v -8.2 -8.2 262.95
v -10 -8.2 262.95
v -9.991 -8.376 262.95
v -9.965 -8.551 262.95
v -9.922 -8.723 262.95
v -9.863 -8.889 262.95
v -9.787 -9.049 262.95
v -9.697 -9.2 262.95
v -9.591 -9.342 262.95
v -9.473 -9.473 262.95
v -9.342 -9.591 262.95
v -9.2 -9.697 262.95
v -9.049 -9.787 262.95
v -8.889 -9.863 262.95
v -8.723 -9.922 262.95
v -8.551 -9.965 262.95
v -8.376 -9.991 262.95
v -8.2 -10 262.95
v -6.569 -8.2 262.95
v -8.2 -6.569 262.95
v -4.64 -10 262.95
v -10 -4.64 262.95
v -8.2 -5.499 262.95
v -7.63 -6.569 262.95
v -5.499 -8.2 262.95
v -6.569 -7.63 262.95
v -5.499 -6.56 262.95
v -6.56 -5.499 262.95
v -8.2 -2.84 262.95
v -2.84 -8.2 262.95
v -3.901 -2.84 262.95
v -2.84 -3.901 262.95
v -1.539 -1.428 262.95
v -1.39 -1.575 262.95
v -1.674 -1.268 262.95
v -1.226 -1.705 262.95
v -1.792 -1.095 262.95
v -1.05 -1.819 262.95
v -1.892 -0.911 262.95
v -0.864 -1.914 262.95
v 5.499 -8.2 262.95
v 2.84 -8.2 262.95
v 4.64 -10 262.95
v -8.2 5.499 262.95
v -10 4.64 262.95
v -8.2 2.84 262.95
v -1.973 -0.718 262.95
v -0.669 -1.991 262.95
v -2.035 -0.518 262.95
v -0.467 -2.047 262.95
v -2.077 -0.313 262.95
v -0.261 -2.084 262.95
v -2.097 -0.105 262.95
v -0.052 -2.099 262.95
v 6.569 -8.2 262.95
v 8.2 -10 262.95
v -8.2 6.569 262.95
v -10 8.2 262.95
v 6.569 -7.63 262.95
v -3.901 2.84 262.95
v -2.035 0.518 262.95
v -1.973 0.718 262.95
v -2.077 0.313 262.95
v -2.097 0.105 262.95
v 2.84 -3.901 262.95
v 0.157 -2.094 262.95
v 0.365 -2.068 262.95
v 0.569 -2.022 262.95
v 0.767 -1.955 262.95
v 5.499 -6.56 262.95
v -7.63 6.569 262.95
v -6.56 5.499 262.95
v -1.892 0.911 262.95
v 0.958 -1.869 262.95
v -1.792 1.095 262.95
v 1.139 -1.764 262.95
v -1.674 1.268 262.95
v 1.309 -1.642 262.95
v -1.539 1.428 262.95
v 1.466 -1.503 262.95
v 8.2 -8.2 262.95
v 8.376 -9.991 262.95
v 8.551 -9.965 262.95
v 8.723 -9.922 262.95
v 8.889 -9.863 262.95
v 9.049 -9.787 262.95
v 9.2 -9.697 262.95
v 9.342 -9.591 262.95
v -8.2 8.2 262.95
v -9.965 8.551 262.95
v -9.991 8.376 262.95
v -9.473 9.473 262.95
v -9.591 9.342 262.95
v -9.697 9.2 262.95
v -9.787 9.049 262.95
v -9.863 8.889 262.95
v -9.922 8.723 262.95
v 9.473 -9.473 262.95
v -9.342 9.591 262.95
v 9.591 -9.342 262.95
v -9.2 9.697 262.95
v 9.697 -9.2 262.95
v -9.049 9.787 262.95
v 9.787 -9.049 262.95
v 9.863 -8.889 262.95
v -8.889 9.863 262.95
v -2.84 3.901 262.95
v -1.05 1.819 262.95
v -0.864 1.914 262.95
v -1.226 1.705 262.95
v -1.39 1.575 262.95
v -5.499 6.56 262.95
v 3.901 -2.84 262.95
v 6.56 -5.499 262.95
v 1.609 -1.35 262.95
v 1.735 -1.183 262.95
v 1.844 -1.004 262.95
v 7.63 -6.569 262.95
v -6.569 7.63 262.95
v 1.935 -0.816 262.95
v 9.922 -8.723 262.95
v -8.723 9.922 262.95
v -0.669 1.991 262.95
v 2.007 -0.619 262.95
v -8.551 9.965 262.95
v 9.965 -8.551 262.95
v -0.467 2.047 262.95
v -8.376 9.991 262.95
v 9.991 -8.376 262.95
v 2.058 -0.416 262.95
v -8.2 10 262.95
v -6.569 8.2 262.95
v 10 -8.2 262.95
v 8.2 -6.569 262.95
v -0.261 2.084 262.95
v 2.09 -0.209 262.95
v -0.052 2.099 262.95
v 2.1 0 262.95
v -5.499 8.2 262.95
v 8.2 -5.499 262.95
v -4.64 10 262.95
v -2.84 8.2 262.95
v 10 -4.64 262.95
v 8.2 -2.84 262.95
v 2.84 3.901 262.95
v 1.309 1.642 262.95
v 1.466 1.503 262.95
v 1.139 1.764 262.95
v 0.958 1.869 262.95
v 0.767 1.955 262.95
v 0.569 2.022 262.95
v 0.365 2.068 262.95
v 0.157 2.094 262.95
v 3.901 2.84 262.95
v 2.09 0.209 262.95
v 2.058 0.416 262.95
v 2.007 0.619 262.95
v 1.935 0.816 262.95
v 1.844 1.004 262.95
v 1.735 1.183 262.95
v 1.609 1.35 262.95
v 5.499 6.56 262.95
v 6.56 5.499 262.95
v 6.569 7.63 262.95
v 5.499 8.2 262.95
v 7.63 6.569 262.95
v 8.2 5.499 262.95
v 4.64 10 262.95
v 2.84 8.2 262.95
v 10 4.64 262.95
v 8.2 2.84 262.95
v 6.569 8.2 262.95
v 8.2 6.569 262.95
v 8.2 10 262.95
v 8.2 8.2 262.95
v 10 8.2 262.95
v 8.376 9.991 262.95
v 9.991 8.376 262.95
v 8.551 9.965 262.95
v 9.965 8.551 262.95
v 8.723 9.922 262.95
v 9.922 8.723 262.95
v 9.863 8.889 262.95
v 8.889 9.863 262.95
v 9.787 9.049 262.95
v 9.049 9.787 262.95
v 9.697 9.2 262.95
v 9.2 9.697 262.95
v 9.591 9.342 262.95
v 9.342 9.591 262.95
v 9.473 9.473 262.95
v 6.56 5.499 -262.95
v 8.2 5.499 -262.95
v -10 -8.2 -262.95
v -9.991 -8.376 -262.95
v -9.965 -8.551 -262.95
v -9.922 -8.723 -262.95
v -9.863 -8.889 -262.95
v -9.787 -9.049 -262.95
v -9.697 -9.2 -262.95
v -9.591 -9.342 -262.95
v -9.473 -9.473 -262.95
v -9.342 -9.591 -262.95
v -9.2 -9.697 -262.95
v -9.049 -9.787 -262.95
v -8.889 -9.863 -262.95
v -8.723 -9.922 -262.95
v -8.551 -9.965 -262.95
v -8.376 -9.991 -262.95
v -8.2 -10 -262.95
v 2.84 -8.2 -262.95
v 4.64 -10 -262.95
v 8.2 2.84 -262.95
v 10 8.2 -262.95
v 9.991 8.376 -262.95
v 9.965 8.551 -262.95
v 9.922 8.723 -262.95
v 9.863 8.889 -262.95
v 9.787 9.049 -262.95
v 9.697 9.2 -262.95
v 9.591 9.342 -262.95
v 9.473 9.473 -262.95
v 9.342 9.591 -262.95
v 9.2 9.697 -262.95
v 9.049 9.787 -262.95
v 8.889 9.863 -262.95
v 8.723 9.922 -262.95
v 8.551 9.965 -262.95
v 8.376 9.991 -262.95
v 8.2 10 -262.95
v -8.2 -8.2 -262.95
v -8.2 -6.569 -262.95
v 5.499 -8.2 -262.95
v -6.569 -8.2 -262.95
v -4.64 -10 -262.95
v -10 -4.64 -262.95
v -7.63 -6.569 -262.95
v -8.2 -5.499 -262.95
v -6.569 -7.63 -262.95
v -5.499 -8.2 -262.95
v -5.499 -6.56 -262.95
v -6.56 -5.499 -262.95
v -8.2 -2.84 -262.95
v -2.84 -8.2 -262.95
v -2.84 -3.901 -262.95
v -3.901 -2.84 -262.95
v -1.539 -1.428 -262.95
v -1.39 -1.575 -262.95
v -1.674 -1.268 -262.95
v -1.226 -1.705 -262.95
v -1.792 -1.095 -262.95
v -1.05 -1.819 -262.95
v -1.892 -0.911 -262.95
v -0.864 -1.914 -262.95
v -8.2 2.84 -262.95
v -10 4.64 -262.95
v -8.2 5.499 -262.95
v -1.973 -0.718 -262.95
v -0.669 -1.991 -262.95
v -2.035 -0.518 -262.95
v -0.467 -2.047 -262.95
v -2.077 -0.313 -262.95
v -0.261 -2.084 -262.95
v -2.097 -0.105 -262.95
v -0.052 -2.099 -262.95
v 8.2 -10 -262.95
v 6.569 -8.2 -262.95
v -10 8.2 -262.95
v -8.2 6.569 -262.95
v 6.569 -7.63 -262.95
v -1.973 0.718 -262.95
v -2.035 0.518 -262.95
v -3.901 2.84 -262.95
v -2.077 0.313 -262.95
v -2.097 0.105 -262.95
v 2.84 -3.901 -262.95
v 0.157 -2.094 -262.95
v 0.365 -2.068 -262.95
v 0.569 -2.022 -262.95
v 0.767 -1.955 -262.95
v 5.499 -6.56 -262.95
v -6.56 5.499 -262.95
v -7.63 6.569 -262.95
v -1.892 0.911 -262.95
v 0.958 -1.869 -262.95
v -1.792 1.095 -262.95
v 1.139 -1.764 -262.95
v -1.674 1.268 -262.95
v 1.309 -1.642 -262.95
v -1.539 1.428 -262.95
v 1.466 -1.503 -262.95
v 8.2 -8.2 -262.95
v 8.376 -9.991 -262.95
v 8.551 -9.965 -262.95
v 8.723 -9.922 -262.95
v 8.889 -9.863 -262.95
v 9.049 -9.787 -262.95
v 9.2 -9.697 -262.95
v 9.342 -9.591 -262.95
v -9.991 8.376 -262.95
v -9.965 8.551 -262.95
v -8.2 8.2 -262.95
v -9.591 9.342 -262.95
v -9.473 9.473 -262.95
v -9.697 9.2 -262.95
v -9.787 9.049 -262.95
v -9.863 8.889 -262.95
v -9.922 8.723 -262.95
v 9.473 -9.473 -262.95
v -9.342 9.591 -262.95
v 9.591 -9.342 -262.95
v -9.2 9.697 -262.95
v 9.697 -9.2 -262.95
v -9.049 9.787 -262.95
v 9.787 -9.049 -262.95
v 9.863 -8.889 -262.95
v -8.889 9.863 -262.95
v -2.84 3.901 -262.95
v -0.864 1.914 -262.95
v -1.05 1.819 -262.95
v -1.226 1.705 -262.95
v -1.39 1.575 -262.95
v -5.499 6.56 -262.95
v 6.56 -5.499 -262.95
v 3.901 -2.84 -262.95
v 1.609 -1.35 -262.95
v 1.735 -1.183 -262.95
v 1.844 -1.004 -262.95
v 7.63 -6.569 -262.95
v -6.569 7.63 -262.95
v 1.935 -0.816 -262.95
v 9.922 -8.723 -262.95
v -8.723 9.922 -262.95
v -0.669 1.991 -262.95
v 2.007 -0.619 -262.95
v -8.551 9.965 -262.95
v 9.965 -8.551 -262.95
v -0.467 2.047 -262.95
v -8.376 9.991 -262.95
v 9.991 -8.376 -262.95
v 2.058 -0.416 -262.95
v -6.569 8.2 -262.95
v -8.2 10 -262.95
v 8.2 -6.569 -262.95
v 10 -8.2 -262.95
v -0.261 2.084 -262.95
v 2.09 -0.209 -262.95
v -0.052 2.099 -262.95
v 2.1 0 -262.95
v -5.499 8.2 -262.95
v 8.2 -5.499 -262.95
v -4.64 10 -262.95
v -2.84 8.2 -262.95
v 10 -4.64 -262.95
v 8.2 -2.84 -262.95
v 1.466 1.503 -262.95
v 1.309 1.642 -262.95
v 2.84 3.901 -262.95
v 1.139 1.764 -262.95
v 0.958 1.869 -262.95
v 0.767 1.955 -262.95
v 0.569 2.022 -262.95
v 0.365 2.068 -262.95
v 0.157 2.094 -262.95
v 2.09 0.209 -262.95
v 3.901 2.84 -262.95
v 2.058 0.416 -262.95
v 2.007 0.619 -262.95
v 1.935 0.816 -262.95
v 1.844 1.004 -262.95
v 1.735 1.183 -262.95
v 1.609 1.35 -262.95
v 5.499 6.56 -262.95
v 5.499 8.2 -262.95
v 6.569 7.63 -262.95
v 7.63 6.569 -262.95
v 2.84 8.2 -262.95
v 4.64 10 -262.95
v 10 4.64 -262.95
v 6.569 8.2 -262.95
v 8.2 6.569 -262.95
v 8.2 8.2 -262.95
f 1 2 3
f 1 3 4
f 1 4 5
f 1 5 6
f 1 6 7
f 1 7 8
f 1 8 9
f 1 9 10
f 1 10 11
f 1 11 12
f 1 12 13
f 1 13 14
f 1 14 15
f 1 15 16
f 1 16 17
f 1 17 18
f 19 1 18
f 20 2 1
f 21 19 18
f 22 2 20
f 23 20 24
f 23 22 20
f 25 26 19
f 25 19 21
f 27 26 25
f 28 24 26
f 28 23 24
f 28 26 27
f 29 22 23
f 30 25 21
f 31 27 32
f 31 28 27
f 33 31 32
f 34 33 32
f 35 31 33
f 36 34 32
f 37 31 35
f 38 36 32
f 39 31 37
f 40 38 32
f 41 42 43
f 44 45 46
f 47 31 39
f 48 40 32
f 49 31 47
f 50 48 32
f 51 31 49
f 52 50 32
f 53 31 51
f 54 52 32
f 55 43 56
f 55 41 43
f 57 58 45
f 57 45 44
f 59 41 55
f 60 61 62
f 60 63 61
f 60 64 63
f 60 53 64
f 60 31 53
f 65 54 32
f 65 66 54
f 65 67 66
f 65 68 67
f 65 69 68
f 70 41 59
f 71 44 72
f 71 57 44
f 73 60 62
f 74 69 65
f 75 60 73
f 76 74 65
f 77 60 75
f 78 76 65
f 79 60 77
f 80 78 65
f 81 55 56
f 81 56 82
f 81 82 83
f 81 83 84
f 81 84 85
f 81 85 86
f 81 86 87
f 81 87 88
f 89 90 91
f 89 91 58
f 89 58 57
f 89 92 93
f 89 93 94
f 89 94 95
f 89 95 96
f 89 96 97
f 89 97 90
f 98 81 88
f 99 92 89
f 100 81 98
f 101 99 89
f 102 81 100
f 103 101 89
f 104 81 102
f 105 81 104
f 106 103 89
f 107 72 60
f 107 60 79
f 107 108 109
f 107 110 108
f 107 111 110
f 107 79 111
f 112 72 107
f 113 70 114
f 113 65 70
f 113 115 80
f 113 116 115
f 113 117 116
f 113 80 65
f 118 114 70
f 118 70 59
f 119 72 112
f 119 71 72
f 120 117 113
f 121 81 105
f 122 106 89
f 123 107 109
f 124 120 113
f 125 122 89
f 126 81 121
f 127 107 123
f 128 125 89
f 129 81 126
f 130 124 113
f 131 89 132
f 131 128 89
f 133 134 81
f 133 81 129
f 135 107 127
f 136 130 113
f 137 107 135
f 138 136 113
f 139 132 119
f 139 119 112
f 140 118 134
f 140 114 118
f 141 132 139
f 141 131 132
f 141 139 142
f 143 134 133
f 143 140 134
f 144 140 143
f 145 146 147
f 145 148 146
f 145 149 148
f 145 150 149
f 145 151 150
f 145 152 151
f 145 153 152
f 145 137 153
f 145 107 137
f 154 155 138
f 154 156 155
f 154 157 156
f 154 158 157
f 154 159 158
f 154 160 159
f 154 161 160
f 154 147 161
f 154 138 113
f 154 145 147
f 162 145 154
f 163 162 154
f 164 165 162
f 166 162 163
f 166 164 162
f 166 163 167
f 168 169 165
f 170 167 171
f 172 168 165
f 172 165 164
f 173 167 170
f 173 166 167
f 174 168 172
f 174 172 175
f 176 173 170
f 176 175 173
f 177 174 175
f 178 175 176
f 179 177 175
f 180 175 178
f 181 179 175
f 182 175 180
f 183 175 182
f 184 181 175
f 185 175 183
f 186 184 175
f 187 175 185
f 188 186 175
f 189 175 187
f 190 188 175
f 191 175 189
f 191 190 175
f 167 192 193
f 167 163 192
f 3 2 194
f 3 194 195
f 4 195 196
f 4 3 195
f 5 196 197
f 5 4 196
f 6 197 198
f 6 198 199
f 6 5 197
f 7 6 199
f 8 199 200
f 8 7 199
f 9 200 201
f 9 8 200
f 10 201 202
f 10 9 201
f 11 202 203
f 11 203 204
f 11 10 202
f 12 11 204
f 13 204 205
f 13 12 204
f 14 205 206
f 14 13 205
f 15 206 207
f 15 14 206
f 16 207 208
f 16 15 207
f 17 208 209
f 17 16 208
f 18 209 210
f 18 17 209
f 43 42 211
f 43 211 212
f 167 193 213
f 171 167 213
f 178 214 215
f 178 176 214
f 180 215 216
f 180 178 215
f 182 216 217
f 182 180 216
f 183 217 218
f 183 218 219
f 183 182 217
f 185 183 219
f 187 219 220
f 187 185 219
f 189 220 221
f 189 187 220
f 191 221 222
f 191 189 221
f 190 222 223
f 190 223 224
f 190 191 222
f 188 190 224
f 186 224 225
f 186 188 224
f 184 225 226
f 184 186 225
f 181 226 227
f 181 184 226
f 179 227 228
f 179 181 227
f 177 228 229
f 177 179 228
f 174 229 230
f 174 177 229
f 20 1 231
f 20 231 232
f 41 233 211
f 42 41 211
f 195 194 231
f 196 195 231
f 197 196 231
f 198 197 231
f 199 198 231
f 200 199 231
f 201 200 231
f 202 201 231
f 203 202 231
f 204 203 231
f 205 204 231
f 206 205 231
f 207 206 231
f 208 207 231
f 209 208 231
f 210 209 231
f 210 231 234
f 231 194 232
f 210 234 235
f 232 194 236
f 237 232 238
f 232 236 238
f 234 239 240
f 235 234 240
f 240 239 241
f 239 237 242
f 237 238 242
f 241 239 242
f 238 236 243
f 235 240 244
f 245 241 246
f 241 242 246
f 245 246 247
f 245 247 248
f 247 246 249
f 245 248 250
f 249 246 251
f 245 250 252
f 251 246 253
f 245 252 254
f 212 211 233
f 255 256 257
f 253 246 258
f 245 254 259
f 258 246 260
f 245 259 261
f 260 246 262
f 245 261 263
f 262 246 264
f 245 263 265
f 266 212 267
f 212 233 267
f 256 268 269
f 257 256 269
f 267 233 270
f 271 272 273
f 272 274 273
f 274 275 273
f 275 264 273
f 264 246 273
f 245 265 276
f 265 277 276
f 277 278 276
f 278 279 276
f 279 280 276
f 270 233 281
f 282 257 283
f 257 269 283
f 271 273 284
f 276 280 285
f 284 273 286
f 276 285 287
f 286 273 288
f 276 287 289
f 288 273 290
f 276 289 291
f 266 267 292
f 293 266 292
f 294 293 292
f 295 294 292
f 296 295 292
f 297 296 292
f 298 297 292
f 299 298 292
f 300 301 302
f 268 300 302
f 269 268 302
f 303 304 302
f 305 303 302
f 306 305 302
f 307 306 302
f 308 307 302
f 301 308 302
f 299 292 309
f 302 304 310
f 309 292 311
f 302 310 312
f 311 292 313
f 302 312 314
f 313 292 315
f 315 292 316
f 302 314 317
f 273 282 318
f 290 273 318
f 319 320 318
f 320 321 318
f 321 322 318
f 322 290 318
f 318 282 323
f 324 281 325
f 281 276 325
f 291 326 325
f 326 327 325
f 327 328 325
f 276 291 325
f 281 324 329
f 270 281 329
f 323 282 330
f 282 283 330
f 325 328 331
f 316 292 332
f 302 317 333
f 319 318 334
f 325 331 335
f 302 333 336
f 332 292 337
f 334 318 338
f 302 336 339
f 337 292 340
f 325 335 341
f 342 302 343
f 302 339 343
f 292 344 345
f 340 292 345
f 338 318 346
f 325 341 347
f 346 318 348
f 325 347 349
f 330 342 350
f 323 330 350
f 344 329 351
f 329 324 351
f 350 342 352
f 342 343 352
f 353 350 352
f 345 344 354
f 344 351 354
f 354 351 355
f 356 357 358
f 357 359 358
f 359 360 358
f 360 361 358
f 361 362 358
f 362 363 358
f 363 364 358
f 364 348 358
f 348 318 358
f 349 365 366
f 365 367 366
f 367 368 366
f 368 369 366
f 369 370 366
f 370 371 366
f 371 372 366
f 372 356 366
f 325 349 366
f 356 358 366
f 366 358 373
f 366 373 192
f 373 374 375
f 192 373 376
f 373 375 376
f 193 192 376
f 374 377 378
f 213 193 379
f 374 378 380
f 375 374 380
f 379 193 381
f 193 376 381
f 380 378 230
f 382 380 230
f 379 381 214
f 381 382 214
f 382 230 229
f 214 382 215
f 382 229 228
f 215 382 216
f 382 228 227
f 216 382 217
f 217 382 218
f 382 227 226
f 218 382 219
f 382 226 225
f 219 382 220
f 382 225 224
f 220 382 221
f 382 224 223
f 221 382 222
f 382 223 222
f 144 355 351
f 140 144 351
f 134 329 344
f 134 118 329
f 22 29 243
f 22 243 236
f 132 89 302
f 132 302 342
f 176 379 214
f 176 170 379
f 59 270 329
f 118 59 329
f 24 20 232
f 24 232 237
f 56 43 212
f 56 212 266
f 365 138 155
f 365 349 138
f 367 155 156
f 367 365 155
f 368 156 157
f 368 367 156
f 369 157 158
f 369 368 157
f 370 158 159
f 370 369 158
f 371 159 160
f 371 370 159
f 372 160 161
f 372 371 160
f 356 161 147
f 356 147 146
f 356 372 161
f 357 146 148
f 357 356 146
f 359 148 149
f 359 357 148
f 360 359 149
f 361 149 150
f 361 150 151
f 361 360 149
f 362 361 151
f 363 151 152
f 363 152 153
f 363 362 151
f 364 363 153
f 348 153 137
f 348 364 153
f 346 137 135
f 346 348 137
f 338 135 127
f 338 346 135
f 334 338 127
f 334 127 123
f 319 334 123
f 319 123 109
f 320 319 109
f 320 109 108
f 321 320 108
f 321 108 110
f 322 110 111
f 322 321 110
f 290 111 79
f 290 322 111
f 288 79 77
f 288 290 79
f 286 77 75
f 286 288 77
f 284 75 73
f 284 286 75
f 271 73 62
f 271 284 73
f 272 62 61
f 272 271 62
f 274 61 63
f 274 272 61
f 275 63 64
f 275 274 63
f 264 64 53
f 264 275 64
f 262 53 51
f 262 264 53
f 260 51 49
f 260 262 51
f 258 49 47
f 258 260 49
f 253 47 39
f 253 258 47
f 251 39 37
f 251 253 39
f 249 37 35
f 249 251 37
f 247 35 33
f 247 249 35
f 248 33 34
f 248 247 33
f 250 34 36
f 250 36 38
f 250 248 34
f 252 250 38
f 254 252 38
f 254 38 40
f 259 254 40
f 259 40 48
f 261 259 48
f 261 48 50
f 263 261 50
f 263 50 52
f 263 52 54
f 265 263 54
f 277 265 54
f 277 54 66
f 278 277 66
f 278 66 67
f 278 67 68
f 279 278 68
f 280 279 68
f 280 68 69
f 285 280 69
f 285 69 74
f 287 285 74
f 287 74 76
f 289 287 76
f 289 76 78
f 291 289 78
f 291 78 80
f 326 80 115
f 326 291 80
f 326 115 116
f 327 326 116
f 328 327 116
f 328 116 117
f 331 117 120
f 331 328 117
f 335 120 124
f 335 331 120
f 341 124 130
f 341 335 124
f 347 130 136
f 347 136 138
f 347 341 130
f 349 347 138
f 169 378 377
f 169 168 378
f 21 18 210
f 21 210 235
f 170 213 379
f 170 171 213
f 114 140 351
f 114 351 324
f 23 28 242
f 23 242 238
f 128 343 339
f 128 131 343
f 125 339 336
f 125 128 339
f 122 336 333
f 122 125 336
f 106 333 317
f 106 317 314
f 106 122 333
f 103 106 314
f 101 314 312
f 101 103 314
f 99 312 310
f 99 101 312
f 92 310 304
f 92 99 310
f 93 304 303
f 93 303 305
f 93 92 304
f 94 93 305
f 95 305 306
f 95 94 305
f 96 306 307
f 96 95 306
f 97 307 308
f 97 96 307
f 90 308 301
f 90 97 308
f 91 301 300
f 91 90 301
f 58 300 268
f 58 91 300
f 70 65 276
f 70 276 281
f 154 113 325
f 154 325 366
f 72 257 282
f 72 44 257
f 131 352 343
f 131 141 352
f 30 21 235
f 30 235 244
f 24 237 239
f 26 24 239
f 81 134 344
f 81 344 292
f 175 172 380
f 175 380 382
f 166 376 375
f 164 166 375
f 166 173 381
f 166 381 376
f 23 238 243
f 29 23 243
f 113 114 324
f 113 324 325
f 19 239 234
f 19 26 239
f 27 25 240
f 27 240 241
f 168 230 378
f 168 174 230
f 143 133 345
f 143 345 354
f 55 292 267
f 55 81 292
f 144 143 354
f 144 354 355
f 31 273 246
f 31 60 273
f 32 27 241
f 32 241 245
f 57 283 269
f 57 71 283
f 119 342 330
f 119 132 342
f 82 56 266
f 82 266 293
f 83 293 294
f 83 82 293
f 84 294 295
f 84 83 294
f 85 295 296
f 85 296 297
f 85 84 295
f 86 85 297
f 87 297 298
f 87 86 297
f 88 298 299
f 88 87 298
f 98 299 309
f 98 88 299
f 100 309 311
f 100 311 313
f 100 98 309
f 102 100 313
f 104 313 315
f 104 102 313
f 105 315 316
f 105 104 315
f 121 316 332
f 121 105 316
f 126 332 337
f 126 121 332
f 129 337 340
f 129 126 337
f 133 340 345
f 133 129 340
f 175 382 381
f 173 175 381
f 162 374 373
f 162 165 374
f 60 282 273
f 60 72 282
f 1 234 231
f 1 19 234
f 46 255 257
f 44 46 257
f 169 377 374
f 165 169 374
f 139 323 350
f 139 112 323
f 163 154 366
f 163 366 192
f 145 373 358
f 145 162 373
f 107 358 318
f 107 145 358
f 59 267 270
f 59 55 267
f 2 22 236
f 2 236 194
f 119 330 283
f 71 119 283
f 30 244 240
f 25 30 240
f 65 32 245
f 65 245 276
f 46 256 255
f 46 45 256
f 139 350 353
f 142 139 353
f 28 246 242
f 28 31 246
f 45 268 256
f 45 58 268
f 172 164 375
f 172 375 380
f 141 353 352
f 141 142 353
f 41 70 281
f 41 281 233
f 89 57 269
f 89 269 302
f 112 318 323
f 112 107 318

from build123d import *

# Parameters (mm, degrees)
SKETCH1_R      = 2.1
EXTRUDE1_DEPTH = 262.95


with BuildPart() as part:
    # Sketch1 → Extrude1 (new, symmetric)
    with BuildSketch(Plane.XY):
        with BuildLine():
            Line((-3.900660172, 0), (-3.900660172, -2.84))
            Line((-3.900660172, -2.84), (-6.56, -5.499339828))
            Line((-6.56, -5.499339828), (-8.2, -5.499339828))
            Line((-8.2, -5.499339828), (-8.2, -2.84))
            Line((-8.2, -2.84), (-10, -4.64))
            Line((-10, -4.64), (-10, -8.2))
            ThreePointArc((-10, -8.2), (-9.472792206, -9.472792206), (-8.2, -10))
            Line((-8.2, -10), (-4.64, -10))
            Line((-4.64, -10), (-2.84, -8.2))
            Line((-2.84, -8.2), (-5.499339828, -8.2))
            Line((-5.499339828, -8.2), (-5.499339828, -6.56))
            Line((-5.499339828, -6.56), (-2.84, -3.900660172))
            Line((-2.84, -3.900660172), (0, -3.900660172))
            Line((0, -3.900660172), (2.84, -3.900660172))
            Line((2.84, -3.900660172), (5.499339828, -6.56))
            Line((5.499339828, -6.56), (5.499339828, -8.2))
            Line((5.499339828, -8.2), (2.84, -8.2))
            Line((2.84, -8.2), (4.64, -10))
            Line((4.64, -10), (8.2, -10))
            ThreePointArc((8.2, -10), (9.472792206, -9.472792206), (10, -8.2))
            Line((10, -8.2), (10, -4.64))
            Line((10, -4.64), (8.2, -2.84))
            Line((8.2, -2.84), (8.2, -5.499339828))
            Line((8.2, -5.499339828), (6.56, -5.499339828))
            Line((6.56, -5.499339828), (3.900660172, -2.84))
            Line((3.900660172, -2.84), (3.900660172, 0))
            Line((3.900660172, 0), (3.900660172, 2.84))
            Line((3.900660172, 2.84), (6.56, 5.499339828))
            Line((6.56, 5.499339828), (8.2, 5.499339828))
            Line((8.2, 5.499339828), (8.2, 2.84))
            Line((8.2, 2.84), (10, 4.64))
            Line((10, 4.64), (10, 8.2))
            ThreePointArc((10, 8.2), (9.472792206, 9.472792206), (8.2, 10))
            Line((8.2, 10), (4.64, 10))
            Line((4.64, 10), (2.84, 8.2))
            Line((2.84, 8.2), (5.499339828, 8.2))
            Line((5.499339828, 8.2), (5.499339828, 6.56))
            Line((5.499339828, 6.56), (2.84, 3.900660172))
            Line((2.84, 3.900660172), (0, 3.900660172))
            Line((0, 3.900660172), (-2.84, 3.900660172))
            Line((-2.84, 3.900660172), (-5.499339828, 6.56))
            Line((-5.499339828, 6.56), (-5.499339828, 8.2))
            Line((-5.499339828, 8.2), (-2.84, 8.2))
            Line((-2.84, 8.2), (-4.64, 10))
            Line((-4.64, 10), (-8.2, 10))
            ThreePointArc((-8.2, 10), (-9.472792206, 9.472792206), (-10, 8.2))
            Line((-10, 8.2), (-10, 4.64))
            Line((-10, 4.64), (-8.2, 2.84))
            Line((-8.2, 2.84), (-8.2, 5.499339828))
            Line((-8.2, 5.499339828), (-6.56, 5.499339828))
            Line((-6.56, 5.499339828), (-3.900660172, 2.84))
            Line((-3.900660172, 2.84), (-3.900660172, 0))
        make_face()
        Circle(SKETCH1_R, mode=Mode.SUBTRACT)
        Polygon((-8.2, -8.2), (-8.2, -6.569339828), (-7.63, -6.569339828), (-6.569339828, -7.63), (-6.569339828, -8.2), align=None, mode=Mode.SUBTRACT)
        Polygon((-8.2, 6.569339828), (-8.2, 8.2), (-6.569339828, 8.2), (-6.569339828, 7.63), (-7.63, 6.569339828), align=None, mode=Mode.SUBTRACT)
        Polygon((6.569339828, 8.2), (8.2, 8.2), (8.2, 6.569339828), (7.63, 6.569339828), (6.569339828, 7.63), align=None, mode=Mode.SUBTRACT)
        Polygon((8.2, -6.569339828), (8.2, -8.2), (6.569339828, -8.2), (6.569339828, -7.63), (7.63, -6.569339828), align=None, mode=Mode.SUBTRACT)
    extrude(amount=EXTRUDE1_DEPTH, both=True)


solid = part.part
